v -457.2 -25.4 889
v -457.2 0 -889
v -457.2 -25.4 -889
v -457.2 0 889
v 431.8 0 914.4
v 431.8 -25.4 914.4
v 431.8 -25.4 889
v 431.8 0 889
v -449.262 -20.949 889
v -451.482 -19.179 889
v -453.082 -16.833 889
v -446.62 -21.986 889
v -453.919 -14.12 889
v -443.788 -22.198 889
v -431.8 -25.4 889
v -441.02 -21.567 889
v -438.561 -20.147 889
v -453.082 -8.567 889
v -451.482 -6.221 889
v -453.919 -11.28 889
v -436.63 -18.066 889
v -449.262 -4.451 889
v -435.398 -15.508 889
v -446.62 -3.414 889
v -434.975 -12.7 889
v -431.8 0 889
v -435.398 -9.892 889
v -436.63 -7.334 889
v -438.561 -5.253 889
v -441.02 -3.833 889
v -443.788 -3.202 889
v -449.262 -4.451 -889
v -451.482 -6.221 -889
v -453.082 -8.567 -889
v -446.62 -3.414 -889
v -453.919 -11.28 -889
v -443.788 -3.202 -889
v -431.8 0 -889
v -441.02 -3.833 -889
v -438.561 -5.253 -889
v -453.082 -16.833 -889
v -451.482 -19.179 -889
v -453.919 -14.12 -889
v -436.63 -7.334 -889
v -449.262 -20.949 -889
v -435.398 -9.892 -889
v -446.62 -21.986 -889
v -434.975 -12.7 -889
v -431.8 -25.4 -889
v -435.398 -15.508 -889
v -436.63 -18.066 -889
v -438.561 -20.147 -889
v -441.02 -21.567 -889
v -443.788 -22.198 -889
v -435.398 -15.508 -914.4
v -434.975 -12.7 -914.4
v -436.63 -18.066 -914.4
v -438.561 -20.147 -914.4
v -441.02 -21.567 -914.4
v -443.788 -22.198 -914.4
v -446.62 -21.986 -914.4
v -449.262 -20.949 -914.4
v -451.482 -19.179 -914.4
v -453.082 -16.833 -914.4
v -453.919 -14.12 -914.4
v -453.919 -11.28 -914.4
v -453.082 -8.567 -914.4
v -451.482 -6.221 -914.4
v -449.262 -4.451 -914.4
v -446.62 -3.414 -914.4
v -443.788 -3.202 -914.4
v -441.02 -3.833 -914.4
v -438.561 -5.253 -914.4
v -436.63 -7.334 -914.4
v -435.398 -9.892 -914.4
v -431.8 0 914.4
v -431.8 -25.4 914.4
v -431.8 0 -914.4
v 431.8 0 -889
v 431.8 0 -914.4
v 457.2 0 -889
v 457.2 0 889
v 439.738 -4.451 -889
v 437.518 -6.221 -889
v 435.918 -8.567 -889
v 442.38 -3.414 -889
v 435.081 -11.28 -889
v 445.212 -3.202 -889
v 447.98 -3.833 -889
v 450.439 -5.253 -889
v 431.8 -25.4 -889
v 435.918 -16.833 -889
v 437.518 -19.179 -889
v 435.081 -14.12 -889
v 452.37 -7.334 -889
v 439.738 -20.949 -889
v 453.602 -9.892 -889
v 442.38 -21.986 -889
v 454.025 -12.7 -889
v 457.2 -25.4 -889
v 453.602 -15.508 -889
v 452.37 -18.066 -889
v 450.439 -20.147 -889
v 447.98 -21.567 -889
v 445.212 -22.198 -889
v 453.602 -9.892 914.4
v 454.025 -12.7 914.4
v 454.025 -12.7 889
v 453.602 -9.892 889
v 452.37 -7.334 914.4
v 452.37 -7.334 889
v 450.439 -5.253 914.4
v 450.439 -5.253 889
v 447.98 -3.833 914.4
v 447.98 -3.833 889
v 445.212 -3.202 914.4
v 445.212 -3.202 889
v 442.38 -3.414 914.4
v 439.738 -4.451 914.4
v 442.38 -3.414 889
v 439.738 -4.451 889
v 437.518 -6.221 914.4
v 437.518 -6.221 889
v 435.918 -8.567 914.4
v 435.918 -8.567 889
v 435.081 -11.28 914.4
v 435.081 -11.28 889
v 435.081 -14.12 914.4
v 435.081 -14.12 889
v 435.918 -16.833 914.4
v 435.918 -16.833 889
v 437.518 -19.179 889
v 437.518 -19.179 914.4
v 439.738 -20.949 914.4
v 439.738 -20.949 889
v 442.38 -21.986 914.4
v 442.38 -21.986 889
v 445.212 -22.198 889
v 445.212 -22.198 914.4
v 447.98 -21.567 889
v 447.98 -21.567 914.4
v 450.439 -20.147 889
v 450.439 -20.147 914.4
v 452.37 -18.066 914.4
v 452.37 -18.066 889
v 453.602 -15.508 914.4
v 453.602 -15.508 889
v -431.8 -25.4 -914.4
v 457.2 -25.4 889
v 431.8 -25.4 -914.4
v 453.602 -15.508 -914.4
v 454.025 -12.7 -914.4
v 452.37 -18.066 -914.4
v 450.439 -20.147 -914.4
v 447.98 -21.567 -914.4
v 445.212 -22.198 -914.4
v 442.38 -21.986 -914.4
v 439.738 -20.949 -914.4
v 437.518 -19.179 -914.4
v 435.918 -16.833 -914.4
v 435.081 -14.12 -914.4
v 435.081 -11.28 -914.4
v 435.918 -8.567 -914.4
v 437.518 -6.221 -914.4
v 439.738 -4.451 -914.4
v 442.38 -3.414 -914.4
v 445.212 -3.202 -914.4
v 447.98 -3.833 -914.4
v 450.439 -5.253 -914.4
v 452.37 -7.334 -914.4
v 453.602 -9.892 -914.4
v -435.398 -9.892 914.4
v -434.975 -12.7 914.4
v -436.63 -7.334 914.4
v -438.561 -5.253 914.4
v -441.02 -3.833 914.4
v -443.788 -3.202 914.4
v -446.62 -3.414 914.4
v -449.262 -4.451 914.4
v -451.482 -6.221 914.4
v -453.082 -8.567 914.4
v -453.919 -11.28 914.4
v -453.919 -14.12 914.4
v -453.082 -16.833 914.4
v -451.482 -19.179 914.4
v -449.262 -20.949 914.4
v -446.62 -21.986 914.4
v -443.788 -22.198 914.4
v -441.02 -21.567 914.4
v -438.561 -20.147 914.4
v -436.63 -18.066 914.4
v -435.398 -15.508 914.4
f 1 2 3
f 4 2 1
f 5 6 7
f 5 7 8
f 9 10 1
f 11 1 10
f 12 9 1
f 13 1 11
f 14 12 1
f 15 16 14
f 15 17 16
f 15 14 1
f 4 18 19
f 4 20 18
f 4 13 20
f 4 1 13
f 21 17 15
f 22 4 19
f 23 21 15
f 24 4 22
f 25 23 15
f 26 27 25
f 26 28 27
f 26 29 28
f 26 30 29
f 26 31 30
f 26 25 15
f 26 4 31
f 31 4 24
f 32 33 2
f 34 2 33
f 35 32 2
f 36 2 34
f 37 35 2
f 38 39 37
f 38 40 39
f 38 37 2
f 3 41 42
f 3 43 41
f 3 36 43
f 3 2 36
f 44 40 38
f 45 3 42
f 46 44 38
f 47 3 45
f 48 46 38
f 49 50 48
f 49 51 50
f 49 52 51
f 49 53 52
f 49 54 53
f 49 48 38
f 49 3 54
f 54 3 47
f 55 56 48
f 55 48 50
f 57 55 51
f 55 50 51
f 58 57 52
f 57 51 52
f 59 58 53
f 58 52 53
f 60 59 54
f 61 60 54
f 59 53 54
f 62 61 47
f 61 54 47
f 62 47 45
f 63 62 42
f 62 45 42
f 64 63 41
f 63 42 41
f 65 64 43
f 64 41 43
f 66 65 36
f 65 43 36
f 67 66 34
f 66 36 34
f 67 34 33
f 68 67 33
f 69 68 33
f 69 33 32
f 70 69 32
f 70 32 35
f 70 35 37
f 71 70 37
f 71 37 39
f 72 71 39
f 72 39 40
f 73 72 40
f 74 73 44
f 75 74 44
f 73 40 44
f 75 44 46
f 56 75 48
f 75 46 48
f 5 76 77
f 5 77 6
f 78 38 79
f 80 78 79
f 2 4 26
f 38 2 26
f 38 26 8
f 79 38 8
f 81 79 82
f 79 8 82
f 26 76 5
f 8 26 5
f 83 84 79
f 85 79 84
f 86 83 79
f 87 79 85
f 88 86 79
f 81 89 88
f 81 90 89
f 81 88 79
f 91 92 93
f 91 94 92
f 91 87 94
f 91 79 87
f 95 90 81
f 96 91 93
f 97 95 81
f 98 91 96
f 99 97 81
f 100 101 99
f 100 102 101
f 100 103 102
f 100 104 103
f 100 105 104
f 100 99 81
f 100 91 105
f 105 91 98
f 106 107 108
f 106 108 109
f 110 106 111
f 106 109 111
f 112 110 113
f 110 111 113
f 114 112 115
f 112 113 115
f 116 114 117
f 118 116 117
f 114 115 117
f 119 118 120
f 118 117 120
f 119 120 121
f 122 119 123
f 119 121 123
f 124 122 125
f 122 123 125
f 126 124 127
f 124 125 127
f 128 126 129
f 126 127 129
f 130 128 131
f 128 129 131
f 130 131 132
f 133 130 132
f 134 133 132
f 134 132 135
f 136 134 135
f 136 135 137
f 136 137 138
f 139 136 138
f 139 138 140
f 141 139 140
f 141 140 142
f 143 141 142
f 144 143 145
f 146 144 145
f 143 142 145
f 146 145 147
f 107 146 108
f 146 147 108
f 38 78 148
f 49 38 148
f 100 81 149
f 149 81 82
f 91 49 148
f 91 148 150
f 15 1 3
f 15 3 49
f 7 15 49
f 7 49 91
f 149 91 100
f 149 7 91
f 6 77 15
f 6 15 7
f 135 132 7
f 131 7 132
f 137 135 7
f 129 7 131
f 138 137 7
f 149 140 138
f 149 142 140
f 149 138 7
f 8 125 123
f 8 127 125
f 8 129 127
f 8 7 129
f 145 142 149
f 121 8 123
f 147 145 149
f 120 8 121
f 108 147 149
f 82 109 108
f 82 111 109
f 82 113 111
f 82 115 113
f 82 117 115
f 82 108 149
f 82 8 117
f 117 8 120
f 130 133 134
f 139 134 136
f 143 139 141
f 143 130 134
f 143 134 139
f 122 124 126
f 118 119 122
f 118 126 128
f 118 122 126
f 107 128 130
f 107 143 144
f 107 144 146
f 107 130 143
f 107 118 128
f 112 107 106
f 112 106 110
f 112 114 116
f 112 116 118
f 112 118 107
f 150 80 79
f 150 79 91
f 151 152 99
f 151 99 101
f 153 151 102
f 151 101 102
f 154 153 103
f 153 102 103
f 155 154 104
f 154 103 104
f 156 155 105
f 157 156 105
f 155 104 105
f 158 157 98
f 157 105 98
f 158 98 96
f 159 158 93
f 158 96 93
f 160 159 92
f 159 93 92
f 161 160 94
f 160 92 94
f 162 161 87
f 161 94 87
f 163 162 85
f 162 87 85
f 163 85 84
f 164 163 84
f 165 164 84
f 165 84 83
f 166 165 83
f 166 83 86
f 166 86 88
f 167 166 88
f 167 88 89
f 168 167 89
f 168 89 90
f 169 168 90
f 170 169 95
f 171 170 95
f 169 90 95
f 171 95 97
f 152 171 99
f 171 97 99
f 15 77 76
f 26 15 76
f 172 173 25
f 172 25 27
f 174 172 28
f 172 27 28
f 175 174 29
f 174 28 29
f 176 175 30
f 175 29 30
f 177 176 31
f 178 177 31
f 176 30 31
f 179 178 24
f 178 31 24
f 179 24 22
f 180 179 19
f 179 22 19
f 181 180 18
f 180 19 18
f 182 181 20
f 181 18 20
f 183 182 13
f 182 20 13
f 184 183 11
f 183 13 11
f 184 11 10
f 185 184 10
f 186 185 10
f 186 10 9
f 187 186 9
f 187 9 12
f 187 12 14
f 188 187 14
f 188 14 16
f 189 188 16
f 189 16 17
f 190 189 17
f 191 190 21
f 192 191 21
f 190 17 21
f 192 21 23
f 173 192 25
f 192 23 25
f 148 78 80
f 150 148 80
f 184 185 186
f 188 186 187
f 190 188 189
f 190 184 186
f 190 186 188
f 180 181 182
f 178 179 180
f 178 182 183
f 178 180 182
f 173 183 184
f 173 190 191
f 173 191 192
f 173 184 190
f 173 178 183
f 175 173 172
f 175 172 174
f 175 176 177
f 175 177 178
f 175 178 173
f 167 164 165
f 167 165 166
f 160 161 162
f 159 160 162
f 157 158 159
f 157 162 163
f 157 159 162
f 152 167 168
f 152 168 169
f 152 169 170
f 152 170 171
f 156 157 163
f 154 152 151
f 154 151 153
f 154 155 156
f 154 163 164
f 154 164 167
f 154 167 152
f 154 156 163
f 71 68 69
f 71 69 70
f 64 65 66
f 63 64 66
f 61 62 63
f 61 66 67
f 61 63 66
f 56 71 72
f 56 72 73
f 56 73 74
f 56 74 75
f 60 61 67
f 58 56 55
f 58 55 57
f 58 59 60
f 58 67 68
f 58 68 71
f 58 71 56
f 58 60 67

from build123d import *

# Parameters (mm, degrees)
F0_W      = 914.4
F0_H      = 1828.8
F1_DEPTH  = 25.4
F2_W      = 25.4
F2_H      = 25.4
F3_DEPTH  = 25.4
F4_W      = 25.4
F4_H      = 25.4
F5_DEPTH  = 25.4
F6_R      = 9.525
F7_DEPTH  = 25.4
F8_R      = 9.525
F9_DEPTH  = 25.4
F10_R     = 9.525
F11_DEPTH = 25.4
F12_R     = 9.525
F13_DEPTH = 25.4


with BuildPart() as f1:
    # F0 (on Front) → F1 (new body)
    with BuildSketch(Plane.XZ):
        Rectangle(F0_W, F0_H)
    extrude(amount=F1_DEPTH)

    # F2 (on face) → F3 (cut)
    with BuildSketch(Plane.XY.offset(914.4)):
        with Locations((-444.5, -12.7)):
            Rectangle(F2_W, F2_H)
        with Locations((444.5, -12.7)):
            Rectangle(F2_W, F2_H)
    extrude(amount=-F3_DEPTH, mode=Mode.SUBTRACT)

    # F4 (on face) → F5 (cut)
    with BuildSketch(Plane(origin=(0, 0, -914.4), x_dir=(1, 0, 0), z_dir=(0, 0, -1))):
        with Locations((-444.5, 12.7)):
            Rectangle(F4_W, F4_H)
        with Locations((444.5, 12.7)):
            Rectangle(F4_W, F4_H)
    extrude(amount=-F5_DEPTH, mode=Mode.SUBTRACT)

    # F6 (on face) → F7 (join)
    with BuildSketch(Plane.XY.offset(889)):
        with Locations((-444.5, -12.7)):
            Circle(F6_R)
    extrude(amount=F7_DEPTH)

    # F8 (on face) → F9 (join)
    with BuildSketch(Plane.XY.offset(889)):
        with Locations((444.5, -12.7)):
            Circle(F8_R)
    extrude(amount=F9_DEPTH)

    # F10 (on face) → F11 (join)
    with BuildSketch(Plane(origin=(0, 0, -889), x_dir=(1, 0, 0), z_dir=(0, 0, -1))):
        with Locations((-444.5, 12.7)):
            Circle(F10_R)
    extrude(amount=F11_DEPTH)

    # F12 (on face) → F13 (join)
    with BuildSketch(Plane(origin=(0, 0, -889), x_dir=(1, 0, 0), z_dir=(0, 0, -1))):
        with Locations((444.5, 12.7)):
            Circle(F12_R)
    extrude(amount=F13_DEPTH)


solid = f1.part
